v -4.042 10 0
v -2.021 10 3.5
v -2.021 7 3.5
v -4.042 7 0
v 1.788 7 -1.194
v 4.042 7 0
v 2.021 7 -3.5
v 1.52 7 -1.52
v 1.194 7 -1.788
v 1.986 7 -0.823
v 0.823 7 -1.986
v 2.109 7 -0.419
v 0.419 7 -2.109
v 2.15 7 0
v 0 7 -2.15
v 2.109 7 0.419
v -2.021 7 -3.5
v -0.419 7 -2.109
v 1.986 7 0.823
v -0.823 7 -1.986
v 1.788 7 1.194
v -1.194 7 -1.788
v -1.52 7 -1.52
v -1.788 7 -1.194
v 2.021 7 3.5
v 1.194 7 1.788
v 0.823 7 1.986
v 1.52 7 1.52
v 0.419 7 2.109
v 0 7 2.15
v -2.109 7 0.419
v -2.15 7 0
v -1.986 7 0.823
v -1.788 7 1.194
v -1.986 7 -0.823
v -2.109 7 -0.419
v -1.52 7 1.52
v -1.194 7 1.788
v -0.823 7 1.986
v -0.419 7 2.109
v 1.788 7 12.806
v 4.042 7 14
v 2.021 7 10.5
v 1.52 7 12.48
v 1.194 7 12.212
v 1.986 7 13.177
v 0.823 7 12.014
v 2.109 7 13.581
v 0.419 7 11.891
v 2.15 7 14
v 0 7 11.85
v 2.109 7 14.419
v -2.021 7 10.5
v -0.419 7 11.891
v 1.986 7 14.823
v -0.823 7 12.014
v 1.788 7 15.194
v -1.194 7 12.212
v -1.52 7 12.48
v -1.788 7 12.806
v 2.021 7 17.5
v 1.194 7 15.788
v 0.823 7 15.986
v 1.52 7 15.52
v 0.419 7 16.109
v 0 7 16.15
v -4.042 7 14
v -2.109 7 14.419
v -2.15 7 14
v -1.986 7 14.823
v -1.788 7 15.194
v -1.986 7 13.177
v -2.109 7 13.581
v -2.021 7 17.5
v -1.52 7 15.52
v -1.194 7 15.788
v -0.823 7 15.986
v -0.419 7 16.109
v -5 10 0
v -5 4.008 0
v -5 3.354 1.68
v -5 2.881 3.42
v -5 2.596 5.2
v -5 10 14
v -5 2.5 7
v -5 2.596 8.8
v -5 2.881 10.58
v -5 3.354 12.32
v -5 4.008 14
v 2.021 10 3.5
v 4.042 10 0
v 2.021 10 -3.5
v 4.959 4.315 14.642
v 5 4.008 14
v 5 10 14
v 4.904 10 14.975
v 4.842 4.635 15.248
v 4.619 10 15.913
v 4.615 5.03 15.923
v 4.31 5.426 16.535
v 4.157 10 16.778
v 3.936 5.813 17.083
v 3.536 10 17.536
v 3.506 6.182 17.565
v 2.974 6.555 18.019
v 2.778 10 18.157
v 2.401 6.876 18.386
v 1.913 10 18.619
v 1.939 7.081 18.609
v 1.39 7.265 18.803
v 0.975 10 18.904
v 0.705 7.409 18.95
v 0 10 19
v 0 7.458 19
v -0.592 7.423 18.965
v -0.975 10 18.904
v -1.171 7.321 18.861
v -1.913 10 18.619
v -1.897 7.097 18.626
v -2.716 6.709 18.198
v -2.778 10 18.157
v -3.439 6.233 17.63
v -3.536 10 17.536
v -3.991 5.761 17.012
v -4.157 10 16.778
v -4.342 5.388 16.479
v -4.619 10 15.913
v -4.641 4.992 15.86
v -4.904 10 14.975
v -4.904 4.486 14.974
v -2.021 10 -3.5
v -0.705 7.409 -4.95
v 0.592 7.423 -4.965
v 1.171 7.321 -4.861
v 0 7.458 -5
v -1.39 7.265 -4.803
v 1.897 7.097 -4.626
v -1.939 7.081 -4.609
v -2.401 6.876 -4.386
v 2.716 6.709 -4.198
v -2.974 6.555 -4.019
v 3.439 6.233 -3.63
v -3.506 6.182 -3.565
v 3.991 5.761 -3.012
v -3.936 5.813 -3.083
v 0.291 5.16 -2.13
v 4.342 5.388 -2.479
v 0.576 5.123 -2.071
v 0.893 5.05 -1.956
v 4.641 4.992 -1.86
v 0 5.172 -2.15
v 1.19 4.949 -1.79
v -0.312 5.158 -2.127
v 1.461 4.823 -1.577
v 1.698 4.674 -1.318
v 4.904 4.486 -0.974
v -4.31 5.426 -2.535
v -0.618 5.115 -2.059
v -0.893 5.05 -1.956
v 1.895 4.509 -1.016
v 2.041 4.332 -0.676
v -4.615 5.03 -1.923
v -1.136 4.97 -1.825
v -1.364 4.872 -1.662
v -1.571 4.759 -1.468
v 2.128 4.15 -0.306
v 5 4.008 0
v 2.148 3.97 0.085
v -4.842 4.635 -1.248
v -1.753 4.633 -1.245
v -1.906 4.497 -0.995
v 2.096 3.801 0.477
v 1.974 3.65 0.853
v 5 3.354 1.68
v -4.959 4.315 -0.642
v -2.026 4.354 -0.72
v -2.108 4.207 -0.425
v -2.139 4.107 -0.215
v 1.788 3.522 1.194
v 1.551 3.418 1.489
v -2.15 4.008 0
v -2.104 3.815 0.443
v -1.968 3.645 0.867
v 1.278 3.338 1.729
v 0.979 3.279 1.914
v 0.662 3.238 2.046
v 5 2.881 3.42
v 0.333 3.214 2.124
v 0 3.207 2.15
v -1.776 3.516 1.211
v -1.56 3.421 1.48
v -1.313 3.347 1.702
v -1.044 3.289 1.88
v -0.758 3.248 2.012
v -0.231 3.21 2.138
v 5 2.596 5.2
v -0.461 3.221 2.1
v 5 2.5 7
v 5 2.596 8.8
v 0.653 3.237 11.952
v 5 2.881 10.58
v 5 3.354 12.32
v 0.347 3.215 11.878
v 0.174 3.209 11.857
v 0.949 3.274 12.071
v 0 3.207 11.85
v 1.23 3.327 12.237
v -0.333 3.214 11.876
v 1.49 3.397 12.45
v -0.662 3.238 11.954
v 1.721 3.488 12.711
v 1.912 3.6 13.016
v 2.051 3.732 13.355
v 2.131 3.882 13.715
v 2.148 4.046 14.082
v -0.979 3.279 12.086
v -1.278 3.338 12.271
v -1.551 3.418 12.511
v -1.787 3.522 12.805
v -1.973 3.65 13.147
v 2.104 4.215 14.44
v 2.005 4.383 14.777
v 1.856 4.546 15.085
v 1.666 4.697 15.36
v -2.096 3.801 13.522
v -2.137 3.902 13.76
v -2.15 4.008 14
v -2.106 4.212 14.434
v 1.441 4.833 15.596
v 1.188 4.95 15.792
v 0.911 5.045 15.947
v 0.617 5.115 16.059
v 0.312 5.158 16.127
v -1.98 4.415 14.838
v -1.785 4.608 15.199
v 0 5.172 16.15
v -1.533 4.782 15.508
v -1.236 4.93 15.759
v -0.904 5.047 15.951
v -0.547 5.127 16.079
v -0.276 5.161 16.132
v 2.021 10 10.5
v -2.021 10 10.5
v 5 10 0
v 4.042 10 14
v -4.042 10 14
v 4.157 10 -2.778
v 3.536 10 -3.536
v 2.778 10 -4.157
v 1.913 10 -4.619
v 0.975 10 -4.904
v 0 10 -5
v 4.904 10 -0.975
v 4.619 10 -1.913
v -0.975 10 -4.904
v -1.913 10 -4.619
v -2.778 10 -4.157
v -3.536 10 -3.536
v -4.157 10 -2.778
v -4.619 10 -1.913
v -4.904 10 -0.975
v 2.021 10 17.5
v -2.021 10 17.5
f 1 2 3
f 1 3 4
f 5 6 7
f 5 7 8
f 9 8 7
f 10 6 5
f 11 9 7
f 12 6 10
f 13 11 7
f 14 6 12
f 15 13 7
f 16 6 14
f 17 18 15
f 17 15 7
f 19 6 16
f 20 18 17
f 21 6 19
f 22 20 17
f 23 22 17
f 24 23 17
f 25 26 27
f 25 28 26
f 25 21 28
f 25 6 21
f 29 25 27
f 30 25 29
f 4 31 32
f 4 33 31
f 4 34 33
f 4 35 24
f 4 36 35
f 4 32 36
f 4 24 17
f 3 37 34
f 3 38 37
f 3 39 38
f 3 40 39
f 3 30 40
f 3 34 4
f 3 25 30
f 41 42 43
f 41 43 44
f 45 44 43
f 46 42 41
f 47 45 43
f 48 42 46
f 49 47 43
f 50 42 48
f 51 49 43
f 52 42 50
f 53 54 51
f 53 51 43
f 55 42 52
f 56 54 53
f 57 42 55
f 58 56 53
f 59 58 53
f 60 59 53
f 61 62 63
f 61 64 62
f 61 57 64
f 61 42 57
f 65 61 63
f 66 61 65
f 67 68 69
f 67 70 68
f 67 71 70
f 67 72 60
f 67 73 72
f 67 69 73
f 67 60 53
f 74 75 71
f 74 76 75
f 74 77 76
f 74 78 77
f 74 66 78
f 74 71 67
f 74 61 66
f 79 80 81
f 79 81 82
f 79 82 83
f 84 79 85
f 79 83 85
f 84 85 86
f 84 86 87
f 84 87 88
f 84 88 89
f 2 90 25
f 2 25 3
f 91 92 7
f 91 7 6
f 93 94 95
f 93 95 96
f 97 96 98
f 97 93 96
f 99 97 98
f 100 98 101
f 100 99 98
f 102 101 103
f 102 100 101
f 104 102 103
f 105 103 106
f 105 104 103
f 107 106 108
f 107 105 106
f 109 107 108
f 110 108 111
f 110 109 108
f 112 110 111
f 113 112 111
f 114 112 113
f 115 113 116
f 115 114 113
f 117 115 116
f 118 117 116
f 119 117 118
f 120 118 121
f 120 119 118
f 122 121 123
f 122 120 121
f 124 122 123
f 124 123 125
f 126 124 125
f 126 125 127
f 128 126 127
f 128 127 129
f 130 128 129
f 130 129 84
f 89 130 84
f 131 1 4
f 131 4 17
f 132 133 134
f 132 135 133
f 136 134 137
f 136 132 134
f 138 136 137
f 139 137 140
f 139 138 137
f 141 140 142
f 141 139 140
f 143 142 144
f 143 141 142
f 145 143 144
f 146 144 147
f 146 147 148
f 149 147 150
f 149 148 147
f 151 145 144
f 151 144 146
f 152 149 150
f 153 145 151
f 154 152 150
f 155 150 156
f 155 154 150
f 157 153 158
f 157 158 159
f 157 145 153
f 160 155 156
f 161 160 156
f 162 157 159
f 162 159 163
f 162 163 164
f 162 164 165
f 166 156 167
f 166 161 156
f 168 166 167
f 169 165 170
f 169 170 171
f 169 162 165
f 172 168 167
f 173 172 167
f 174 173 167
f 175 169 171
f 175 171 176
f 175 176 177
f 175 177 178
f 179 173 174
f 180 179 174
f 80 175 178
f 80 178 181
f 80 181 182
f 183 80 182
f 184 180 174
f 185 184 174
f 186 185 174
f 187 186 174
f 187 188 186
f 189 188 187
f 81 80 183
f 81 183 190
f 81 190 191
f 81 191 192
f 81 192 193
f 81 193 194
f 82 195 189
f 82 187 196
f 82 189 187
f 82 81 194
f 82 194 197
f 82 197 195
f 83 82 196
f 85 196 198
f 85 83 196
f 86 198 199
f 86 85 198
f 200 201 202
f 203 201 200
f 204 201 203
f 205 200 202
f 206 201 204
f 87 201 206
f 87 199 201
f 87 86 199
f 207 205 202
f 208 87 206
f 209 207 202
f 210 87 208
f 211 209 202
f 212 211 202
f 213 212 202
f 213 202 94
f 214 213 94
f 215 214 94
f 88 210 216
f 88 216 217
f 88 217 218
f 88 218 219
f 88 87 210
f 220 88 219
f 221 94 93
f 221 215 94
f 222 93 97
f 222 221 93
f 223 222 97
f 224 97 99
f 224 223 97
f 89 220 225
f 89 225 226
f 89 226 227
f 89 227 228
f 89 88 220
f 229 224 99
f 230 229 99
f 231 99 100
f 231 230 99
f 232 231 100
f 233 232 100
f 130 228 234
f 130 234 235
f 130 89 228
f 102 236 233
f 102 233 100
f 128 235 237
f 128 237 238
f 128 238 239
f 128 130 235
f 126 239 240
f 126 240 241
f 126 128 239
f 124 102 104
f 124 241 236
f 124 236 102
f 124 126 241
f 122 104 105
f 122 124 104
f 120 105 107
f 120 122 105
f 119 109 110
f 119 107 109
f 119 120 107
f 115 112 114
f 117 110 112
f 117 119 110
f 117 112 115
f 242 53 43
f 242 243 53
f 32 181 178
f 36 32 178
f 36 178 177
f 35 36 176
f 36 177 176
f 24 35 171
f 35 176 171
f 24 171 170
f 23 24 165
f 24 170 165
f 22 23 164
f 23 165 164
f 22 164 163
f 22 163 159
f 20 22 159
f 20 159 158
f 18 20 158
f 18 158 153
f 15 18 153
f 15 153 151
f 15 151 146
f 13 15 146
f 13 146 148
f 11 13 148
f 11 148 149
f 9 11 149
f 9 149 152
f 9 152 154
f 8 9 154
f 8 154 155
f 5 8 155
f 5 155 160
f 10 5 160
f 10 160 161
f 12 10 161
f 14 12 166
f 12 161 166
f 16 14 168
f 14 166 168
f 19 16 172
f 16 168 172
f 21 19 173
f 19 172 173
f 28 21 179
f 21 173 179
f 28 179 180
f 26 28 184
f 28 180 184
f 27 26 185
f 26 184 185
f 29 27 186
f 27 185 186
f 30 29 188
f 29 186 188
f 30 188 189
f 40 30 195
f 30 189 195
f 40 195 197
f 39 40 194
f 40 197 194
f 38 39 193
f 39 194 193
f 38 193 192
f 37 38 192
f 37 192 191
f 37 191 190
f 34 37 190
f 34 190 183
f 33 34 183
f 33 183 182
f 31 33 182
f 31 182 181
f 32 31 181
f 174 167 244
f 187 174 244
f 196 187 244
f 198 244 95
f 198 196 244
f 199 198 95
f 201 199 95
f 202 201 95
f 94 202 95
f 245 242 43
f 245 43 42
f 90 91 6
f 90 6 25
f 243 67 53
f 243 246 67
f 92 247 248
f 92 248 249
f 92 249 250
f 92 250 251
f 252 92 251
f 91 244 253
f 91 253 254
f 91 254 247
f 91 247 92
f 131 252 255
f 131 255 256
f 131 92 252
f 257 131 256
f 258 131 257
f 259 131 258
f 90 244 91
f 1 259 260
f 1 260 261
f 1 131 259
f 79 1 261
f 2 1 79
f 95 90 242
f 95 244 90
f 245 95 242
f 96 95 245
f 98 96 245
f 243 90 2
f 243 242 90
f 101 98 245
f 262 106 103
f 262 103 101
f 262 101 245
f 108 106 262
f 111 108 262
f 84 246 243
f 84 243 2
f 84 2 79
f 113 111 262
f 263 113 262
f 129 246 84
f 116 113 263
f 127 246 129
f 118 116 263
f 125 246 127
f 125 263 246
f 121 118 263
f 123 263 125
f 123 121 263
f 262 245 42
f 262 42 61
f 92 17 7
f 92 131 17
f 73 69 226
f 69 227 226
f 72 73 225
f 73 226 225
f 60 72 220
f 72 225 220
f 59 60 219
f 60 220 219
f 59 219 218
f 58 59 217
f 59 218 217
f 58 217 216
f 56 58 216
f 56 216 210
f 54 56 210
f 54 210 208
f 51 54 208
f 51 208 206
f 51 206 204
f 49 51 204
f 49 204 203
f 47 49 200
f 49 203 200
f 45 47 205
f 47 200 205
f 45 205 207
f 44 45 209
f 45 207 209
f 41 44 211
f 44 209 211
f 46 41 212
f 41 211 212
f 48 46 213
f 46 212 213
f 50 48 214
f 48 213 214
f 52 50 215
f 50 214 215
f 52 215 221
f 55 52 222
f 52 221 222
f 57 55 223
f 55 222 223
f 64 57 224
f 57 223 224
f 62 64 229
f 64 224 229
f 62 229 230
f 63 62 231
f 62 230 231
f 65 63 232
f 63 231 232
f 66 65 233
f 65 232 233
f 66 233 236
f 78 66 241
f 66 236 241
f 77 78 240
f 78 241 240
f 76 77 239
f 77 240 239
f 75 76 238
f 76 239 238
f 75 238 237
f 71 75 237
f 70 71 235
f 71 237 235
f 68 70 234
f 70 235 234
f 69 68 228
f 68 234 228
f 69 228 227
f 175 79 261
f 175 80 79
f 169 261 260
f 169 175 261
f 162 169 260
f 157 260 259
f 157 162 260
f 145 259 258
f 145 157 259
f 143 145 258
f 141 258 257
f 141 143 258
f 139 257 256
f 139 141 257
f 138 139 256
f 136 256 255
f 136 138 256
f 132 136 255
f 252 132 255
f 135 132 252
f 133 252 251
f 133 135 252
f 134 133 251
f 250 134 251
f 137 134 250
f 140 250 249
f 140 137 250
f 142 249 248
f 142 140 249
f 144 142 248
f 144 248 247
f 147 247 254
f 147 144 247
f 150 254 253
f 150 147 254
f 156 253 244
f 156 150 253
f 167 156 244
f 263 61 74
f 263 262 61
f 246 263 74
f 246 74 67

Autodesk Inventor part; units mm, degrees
ref_plane "YZ Plane" through (0, 0, 0) normal (1, 0, 0) x (0, 1, 0)
ref_plane "XZ Plane" through (0, 0, 0) normal (0, 1, 0) x (-1, 0, 0)
ref_plane "XY Plane" through (0, 0, 0) normal (0, 0, 1) x (1, 0, 0)
sketch "Sketch1" plane through (0, 0, 0) normal (0, 1, 0) x (-1, 0, 0)
  arc A0 (-5, 0) -> (5, 0) centre (0, 0) ccw
  circle A1 centre (0, 0) radius 2.15
  arc A2 (5, 14) -> (-5, 14) centre (0, 14) ccw
  circle A3 centre (0, 14) radius 2.15
  line L0 (-5, 0) -> (-5, 14)
  line L1 (5, 0) -> (5, 14)
  line L2 (0, 0) -> (0, 2.15)
  line L3 (0, 9) -> (0, 14)
  dimension "d1" = 4.3
  dimension "d0" = 10
  dimension "d9" = 14
  dimension "d10" = 10
  dimension "d11" = 4.3
extrude "Extrusion1" add sketch "Sketch1" along normal blind 10
sketch "Sketch2" plane through (0, 10, 0) normal (0, 1, 0) x (-1, 0, 0)
  line L0 (2.0207, 3.5) -> (4.0415, 0)
  line L1 (4.0415, 0) -> (2.0207, -3.5)
  line L2 (2.0207, -3.5) -> (-2.0207, -3.5)
  line L3 (-2.0207, -3.5) -> (-4.0415, 0)
  line L4 (-4.0415, 0) -> (-2.0207, 3.5)
  line L5 (-2.0207, 3.5) -> (2.0207, 3.5)
  circle A0 centre (0, 14) radius 2.15 projected
  line L6 (-4.0415, 14) -> (-2.0207, 17.5)
  line L7 (-2.0207, 17.5) -> (2.0207, 17.5)
  line L8 (2.0207, 17.5) -> (4.0415, 14)
  line L9 (4.0415, 14) -> (2.0207, 10.5)
  line L10 (2.0207, 10.5) -> (-2.0207, 10.5)
  line L11 (-2.0207, 10.5) -> (-4.0415, 14)
  point P0 (0, 0)
  point P1 (0, 0)
  dimension "d4" = 7
  dimension "d15" = 7
extrude "Extrusion2" cut sketch "Sketch2" against normal blind 3
sketch "Sketch3" plane through (0, 0, 0) normal (1, 0, 0) x (0, 1, 0)
  line L0 (0, 0) -> (0, 7)
  line L1 (0, 2.15) -> (0, -2.15) projected
  line L2 (0, 7) -> (19.5, 7)
  circle A0 centre (19.5, 7) radius 17
  line L3 (7, -2.15) -> (7, 2.15) projected
  line L4 (7, 0) -> (7, 3.5) projected
  line L5 (7, -3.5) -> (7, 0) projected
  line L6 (7, 0) -> (7, -3.5) projected
  line L7 (7, 3.5) -> (7, 0) projected
  circle A1 centre (19.5, 7) radius 30.634
  dimension "d7" = 7
  dimension "d8" = 19.5
  dimension "d12" = 34
extrude "Extrusion3" cut sketch "Sketch3" along normal through all both and the other way through all
equation "\"d15\" = d4"
properties part number "Spacer_Collective_Base_NutM4"
